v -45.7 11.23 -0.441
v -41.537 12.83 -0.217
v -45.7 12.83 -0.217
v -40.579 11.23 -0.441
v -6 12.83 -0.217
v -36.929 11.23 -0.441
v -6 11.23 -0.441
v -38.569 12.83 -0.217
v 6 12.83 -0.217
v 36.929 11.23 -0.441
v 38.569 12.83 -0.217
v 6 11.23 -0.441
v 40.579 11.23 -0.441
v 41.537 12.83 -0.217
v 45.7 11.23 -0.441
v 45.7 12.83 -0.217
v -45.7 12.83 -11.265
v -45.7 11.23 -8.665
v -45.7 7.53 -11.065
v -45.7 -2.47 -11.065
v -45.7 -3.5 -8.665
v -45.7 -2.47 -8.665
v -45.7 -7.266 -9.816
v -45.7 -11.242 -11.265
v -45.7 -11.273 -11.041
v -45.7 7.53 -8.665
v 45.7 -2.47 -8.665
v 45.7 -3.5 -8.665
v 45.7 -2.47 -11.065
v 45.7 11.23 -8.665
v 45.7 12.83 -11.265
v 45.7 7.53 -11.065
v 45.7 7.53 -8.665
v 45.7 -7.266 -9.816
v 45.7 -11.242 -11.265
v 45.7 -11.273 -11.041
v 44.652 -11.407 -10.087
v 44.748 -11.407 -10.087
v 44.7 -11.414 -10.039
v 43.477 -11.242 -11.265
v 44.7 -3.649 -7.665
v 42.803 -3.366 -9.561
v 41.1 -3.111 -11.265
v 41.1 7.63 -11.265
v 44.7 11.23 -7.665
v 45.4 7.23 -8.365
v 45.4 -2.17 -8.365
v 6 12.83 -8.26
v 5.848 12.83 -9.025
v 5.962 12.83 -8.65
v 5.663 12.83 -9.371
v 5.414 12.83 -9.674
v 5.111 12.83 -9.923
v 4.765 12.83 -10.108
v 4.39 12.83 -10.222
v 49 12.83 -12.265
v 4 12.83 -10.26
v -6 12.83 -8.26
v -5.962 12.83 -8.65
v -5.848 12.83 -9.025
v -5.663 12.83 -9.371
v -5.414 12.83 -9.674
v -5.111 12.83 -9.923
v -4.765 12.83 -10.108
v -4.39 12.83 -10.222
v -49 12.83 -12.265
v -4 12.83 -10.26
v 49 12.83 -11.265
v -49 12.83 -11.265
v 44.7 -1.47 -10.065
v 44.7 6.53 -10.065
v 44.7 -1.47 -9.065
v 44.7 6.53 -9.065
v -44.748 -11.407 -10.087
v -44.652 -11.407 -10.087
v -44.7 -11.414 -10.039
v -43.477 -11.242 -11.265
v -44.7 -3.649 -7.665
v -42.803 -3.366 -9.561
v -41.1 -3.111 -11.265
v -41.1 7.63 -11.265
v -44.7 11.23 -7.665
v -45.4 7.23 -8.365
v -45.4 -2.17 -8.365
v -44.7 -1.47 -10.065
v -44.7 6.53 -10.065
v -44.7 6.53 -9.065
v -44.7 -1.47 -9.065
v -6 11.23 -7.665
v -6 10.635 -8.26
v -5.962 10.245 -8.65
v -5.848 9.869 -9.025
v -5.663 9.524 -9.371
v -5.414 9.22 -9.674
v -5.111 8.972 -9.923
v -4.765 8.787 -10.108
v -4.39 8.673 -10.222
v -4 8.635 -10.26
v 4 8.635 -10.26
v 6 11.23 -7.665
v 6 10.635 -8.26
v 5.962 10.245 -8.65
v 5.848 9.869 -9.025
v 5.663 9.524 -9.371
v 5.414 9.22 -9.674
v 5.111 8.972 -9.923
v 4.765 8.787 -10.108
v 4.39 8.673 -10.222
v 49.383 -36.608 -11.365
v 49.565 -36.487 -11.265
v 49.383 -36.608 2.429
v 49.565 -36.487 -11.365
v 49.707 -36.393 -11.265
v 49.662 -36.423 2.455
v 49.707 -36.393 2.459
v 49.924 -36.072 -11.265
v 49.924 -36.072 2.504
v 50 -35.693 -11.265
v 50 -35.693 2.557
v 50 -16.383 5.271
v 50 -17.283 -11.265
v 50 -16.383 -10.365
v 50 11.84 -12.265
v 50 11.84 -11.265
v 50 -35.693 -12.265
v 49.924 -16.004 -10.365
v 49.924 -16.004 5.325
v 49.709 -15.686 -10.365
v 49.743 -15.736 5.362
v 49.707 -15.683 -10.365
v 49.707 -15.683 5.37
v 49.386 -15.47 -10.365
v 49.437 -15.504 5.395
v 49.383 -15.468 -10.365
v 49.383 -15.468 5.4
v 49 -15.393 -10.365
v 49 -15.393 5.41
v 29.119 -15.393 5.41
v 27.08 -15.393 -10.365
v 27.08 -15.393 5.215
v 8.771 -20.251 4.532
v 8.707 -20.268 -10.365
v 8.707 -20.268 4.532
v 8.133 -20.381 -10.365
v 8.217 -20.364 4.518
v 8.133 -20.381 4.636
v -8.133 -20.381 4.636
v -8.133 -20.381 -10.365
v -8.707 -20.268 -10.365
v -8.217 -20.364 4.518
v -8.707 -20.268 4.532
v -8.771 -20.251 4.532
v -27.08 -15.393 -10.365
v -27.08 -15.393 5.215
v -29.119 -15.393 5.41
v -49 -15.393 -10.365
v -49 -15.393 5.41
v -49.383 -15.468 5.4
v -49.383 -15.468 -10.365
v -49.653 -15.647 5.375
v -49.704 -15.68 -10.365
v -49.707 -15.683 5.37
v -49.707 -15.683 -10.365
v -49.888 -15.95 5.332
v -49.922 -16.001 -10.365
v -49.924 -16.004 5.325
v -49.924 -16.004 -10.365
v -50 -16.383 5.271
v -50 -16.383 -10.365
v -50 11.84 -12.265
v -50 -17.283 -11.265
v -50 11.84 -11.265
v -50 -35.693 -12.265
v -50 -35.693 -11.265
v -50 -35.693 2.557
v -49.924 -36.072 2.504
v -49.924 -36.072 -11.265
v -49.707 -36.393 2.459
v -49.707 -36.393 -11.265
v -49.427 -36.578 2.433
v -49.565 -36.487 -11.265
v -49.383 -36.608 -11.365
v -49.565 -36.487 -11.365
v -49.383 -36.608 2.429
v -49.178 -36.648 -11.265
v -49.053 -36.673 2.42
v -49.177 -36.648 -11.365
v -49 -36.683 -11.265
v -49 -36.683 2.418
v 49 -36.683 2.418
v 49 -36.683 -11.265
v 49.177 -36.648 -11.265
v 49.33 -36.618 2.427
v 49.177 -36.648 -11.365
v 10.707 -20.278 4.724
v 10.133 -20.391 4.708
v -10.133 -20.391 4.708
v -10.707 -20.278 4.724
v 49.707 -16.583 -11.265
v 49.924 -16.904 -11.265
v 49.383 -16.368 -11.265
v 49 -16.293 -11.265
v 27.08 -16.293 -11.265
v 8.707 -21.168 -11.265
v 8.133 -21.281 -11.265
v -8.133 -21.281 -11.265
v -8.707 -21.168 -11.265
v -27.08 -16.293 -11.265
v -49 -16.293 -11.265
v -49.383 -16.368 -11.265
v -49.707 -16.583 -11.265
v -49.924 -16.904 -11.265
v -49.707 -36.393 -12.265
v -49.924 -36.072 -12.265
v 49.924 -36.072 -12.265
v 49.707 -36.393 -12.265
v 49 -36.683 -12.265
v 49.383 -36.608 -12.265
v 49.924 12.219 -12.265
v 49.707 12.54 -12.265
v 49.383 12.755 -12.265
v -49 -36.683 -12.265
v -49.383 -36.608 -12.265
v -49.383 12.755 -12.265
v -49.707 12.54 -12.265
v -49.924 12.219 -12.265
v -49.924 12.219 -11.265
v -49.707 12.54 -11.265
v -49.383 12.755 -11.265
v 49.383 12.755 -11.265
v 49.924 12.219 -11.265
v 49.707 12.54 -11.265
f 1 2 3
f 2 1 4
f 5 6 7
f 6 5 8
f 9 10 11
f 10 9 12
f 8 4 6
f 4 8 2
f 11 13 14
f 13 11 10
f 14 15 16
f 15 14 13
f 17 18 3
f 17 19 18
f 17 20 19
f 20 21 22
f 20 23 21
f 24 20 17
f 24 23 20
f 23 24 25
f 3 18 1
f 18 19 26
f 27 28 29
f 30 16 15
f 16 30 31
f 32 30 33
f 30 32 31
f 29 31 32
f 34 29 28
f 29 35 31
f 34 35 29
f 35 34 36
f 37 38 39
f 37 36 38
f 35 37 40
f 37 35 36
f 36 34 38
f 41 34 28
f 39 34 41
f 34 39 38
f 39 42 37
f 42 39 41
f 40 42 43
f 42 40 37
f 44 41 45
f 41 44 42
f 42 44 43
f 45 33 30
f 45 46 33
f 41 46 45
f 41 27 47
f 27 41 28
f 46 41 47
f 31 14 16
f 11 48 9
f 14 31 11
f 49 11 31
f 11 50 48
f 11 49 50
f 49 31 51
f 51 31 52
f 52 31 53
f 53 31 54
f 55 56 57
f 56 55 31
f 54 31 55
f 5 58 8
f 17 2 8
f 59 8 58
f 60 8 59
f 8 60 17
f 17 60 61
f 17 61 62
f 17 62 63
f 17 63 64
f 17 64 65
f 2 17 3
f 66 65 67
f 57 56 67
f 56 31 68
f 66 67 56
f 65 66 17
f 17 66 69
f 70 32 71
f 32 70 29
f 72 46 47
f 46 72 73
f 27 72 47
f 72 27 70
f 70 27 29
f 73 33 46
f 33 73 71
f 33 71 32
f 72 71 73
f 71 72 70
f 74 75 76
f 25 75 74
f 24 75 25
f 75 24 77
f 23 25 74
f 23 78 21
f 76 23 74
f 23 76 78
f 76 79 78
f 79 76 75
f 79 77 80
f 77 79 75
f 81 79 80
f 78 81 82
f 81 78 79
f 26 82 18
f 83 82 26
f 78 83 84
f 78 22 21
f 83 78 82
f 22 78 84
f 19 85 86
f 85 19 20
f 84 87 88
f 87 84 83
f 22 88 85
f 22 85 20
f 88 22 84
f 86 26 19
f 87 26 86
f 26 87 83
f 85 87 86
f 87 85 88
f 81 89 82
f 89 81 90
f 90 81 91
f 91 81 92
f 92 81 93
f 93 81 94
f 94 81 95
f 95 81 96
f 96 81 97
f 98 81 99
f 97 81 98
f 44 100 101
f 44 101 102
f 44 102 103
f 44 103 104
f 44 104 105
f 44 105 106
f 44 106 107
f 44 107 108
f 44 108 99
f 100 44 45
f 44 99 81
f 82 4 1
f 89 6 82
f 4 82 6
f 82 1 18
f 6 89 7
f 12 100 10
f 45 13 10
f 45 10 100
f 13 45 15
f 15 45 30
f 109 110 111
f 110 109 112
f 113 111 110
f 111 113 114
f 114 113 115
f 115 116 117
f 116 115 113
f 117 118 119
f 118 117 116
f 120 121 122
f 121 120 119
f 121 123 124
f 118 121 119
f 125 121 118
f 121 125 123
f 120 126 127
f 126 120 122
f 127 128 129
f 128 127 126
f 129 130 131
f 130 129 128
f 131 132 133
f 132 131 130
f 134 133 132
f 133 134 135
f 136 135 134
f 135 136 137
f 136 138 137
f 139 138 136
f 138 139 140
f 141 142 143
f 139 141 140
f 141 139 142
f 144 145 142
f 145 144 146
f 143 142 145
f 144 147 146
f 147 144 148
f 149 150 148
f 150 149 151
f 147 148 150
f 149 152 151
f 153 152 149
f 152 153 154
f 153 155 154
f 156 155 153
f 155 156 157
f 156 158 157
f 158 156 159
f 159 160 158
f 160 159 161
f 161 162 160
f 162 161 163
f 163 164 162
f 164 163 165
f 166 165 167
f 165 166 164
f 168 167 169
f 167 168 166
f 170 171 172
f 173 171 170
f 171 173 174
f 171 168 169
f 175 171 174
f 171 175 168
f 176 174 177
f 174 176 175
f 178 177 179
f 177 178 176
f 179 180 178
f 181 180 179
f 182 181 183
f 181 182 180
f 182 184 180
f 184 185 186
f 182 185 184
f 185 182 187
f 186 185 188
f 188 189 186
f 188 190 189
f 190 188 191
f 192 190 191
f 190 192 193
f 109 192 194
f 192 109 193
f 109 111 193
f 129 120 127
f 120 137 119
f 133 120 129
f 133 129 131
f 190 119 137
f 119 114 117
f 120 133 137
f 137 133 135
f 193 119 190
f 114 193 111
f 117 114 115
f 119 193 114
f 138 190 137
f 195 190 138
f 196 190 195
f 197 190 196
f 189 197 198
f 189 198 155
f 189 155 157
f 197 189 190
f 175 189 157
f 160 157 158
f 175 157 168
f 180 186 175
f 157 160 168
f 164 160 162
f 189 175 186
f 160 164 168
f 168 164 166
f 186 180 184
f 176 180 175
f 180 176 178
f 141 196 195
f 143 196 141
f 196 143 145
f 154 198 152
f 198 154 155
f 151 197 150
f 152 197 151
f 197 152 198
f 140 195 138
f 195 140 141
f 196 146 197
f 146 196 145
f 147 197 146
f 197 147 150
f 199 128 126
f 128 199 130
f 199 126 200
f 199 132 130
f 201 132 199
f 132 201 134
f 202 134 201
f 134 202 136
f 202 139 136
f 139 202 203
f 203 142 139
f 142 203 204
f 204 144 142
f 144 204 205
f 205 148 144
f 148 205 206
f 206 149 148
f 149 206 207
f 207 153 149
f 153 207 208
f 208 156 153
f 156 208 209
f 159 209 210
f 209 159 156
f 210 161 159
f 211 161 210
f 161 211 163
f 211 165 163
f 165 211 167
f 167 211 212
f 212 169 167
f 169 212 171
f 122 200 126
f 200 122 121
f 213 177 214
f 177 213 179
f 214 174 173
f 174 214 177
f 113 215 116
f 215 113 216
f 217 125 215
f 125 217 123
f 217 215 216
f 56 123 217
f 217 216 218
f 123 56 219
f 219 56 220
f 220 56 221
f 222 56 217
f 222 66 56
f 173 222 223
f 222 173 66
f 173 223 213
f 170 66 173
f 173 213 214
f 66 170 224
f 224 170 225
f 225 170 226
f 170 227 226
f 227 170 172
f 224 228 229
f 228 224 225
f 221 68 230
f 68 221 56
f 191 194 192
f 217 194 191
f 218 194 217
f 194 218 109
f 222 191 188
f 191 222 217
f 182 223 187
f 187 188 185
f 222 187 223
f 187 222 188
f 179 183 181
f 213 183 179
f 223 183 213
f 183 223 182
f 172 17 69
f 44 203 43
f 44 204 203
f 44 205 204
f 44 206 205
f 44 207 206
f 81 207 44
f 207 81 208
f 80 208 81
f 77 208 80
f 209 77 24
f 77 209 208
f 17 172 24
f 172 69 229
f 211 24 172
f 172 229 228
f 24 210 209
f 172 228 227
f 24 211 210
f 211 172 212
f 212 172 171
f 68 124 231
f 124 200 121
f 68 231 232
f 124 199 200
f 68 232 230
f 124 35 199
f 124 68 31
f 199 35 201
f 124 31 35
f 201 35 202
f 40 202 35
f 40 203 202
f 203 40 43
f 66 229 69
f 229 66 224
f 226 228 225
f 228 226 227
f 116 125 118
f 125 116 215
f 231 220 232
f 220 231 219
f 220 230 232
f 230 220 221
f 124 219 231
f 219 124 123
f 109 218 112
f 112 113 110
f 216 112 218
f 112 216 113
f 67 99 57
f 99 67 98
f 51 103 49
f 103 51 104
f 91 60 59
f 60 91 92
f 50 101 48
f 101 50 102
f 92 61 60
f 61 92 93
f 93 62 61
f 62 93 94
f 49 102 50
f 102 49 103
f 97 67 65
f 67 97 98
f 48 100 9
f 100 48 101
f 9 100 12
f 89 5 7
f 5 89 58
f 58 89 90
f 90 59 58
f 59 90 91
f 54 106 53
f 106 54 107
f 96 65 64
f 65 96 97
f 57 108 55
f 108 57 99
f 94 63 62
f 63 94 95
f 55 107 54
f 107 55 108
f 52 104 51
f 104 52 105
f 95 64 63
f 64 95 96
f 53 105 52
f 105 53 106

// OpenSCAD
include <drink-me.scad>

present() {
     base_3d(rest=true);
}
